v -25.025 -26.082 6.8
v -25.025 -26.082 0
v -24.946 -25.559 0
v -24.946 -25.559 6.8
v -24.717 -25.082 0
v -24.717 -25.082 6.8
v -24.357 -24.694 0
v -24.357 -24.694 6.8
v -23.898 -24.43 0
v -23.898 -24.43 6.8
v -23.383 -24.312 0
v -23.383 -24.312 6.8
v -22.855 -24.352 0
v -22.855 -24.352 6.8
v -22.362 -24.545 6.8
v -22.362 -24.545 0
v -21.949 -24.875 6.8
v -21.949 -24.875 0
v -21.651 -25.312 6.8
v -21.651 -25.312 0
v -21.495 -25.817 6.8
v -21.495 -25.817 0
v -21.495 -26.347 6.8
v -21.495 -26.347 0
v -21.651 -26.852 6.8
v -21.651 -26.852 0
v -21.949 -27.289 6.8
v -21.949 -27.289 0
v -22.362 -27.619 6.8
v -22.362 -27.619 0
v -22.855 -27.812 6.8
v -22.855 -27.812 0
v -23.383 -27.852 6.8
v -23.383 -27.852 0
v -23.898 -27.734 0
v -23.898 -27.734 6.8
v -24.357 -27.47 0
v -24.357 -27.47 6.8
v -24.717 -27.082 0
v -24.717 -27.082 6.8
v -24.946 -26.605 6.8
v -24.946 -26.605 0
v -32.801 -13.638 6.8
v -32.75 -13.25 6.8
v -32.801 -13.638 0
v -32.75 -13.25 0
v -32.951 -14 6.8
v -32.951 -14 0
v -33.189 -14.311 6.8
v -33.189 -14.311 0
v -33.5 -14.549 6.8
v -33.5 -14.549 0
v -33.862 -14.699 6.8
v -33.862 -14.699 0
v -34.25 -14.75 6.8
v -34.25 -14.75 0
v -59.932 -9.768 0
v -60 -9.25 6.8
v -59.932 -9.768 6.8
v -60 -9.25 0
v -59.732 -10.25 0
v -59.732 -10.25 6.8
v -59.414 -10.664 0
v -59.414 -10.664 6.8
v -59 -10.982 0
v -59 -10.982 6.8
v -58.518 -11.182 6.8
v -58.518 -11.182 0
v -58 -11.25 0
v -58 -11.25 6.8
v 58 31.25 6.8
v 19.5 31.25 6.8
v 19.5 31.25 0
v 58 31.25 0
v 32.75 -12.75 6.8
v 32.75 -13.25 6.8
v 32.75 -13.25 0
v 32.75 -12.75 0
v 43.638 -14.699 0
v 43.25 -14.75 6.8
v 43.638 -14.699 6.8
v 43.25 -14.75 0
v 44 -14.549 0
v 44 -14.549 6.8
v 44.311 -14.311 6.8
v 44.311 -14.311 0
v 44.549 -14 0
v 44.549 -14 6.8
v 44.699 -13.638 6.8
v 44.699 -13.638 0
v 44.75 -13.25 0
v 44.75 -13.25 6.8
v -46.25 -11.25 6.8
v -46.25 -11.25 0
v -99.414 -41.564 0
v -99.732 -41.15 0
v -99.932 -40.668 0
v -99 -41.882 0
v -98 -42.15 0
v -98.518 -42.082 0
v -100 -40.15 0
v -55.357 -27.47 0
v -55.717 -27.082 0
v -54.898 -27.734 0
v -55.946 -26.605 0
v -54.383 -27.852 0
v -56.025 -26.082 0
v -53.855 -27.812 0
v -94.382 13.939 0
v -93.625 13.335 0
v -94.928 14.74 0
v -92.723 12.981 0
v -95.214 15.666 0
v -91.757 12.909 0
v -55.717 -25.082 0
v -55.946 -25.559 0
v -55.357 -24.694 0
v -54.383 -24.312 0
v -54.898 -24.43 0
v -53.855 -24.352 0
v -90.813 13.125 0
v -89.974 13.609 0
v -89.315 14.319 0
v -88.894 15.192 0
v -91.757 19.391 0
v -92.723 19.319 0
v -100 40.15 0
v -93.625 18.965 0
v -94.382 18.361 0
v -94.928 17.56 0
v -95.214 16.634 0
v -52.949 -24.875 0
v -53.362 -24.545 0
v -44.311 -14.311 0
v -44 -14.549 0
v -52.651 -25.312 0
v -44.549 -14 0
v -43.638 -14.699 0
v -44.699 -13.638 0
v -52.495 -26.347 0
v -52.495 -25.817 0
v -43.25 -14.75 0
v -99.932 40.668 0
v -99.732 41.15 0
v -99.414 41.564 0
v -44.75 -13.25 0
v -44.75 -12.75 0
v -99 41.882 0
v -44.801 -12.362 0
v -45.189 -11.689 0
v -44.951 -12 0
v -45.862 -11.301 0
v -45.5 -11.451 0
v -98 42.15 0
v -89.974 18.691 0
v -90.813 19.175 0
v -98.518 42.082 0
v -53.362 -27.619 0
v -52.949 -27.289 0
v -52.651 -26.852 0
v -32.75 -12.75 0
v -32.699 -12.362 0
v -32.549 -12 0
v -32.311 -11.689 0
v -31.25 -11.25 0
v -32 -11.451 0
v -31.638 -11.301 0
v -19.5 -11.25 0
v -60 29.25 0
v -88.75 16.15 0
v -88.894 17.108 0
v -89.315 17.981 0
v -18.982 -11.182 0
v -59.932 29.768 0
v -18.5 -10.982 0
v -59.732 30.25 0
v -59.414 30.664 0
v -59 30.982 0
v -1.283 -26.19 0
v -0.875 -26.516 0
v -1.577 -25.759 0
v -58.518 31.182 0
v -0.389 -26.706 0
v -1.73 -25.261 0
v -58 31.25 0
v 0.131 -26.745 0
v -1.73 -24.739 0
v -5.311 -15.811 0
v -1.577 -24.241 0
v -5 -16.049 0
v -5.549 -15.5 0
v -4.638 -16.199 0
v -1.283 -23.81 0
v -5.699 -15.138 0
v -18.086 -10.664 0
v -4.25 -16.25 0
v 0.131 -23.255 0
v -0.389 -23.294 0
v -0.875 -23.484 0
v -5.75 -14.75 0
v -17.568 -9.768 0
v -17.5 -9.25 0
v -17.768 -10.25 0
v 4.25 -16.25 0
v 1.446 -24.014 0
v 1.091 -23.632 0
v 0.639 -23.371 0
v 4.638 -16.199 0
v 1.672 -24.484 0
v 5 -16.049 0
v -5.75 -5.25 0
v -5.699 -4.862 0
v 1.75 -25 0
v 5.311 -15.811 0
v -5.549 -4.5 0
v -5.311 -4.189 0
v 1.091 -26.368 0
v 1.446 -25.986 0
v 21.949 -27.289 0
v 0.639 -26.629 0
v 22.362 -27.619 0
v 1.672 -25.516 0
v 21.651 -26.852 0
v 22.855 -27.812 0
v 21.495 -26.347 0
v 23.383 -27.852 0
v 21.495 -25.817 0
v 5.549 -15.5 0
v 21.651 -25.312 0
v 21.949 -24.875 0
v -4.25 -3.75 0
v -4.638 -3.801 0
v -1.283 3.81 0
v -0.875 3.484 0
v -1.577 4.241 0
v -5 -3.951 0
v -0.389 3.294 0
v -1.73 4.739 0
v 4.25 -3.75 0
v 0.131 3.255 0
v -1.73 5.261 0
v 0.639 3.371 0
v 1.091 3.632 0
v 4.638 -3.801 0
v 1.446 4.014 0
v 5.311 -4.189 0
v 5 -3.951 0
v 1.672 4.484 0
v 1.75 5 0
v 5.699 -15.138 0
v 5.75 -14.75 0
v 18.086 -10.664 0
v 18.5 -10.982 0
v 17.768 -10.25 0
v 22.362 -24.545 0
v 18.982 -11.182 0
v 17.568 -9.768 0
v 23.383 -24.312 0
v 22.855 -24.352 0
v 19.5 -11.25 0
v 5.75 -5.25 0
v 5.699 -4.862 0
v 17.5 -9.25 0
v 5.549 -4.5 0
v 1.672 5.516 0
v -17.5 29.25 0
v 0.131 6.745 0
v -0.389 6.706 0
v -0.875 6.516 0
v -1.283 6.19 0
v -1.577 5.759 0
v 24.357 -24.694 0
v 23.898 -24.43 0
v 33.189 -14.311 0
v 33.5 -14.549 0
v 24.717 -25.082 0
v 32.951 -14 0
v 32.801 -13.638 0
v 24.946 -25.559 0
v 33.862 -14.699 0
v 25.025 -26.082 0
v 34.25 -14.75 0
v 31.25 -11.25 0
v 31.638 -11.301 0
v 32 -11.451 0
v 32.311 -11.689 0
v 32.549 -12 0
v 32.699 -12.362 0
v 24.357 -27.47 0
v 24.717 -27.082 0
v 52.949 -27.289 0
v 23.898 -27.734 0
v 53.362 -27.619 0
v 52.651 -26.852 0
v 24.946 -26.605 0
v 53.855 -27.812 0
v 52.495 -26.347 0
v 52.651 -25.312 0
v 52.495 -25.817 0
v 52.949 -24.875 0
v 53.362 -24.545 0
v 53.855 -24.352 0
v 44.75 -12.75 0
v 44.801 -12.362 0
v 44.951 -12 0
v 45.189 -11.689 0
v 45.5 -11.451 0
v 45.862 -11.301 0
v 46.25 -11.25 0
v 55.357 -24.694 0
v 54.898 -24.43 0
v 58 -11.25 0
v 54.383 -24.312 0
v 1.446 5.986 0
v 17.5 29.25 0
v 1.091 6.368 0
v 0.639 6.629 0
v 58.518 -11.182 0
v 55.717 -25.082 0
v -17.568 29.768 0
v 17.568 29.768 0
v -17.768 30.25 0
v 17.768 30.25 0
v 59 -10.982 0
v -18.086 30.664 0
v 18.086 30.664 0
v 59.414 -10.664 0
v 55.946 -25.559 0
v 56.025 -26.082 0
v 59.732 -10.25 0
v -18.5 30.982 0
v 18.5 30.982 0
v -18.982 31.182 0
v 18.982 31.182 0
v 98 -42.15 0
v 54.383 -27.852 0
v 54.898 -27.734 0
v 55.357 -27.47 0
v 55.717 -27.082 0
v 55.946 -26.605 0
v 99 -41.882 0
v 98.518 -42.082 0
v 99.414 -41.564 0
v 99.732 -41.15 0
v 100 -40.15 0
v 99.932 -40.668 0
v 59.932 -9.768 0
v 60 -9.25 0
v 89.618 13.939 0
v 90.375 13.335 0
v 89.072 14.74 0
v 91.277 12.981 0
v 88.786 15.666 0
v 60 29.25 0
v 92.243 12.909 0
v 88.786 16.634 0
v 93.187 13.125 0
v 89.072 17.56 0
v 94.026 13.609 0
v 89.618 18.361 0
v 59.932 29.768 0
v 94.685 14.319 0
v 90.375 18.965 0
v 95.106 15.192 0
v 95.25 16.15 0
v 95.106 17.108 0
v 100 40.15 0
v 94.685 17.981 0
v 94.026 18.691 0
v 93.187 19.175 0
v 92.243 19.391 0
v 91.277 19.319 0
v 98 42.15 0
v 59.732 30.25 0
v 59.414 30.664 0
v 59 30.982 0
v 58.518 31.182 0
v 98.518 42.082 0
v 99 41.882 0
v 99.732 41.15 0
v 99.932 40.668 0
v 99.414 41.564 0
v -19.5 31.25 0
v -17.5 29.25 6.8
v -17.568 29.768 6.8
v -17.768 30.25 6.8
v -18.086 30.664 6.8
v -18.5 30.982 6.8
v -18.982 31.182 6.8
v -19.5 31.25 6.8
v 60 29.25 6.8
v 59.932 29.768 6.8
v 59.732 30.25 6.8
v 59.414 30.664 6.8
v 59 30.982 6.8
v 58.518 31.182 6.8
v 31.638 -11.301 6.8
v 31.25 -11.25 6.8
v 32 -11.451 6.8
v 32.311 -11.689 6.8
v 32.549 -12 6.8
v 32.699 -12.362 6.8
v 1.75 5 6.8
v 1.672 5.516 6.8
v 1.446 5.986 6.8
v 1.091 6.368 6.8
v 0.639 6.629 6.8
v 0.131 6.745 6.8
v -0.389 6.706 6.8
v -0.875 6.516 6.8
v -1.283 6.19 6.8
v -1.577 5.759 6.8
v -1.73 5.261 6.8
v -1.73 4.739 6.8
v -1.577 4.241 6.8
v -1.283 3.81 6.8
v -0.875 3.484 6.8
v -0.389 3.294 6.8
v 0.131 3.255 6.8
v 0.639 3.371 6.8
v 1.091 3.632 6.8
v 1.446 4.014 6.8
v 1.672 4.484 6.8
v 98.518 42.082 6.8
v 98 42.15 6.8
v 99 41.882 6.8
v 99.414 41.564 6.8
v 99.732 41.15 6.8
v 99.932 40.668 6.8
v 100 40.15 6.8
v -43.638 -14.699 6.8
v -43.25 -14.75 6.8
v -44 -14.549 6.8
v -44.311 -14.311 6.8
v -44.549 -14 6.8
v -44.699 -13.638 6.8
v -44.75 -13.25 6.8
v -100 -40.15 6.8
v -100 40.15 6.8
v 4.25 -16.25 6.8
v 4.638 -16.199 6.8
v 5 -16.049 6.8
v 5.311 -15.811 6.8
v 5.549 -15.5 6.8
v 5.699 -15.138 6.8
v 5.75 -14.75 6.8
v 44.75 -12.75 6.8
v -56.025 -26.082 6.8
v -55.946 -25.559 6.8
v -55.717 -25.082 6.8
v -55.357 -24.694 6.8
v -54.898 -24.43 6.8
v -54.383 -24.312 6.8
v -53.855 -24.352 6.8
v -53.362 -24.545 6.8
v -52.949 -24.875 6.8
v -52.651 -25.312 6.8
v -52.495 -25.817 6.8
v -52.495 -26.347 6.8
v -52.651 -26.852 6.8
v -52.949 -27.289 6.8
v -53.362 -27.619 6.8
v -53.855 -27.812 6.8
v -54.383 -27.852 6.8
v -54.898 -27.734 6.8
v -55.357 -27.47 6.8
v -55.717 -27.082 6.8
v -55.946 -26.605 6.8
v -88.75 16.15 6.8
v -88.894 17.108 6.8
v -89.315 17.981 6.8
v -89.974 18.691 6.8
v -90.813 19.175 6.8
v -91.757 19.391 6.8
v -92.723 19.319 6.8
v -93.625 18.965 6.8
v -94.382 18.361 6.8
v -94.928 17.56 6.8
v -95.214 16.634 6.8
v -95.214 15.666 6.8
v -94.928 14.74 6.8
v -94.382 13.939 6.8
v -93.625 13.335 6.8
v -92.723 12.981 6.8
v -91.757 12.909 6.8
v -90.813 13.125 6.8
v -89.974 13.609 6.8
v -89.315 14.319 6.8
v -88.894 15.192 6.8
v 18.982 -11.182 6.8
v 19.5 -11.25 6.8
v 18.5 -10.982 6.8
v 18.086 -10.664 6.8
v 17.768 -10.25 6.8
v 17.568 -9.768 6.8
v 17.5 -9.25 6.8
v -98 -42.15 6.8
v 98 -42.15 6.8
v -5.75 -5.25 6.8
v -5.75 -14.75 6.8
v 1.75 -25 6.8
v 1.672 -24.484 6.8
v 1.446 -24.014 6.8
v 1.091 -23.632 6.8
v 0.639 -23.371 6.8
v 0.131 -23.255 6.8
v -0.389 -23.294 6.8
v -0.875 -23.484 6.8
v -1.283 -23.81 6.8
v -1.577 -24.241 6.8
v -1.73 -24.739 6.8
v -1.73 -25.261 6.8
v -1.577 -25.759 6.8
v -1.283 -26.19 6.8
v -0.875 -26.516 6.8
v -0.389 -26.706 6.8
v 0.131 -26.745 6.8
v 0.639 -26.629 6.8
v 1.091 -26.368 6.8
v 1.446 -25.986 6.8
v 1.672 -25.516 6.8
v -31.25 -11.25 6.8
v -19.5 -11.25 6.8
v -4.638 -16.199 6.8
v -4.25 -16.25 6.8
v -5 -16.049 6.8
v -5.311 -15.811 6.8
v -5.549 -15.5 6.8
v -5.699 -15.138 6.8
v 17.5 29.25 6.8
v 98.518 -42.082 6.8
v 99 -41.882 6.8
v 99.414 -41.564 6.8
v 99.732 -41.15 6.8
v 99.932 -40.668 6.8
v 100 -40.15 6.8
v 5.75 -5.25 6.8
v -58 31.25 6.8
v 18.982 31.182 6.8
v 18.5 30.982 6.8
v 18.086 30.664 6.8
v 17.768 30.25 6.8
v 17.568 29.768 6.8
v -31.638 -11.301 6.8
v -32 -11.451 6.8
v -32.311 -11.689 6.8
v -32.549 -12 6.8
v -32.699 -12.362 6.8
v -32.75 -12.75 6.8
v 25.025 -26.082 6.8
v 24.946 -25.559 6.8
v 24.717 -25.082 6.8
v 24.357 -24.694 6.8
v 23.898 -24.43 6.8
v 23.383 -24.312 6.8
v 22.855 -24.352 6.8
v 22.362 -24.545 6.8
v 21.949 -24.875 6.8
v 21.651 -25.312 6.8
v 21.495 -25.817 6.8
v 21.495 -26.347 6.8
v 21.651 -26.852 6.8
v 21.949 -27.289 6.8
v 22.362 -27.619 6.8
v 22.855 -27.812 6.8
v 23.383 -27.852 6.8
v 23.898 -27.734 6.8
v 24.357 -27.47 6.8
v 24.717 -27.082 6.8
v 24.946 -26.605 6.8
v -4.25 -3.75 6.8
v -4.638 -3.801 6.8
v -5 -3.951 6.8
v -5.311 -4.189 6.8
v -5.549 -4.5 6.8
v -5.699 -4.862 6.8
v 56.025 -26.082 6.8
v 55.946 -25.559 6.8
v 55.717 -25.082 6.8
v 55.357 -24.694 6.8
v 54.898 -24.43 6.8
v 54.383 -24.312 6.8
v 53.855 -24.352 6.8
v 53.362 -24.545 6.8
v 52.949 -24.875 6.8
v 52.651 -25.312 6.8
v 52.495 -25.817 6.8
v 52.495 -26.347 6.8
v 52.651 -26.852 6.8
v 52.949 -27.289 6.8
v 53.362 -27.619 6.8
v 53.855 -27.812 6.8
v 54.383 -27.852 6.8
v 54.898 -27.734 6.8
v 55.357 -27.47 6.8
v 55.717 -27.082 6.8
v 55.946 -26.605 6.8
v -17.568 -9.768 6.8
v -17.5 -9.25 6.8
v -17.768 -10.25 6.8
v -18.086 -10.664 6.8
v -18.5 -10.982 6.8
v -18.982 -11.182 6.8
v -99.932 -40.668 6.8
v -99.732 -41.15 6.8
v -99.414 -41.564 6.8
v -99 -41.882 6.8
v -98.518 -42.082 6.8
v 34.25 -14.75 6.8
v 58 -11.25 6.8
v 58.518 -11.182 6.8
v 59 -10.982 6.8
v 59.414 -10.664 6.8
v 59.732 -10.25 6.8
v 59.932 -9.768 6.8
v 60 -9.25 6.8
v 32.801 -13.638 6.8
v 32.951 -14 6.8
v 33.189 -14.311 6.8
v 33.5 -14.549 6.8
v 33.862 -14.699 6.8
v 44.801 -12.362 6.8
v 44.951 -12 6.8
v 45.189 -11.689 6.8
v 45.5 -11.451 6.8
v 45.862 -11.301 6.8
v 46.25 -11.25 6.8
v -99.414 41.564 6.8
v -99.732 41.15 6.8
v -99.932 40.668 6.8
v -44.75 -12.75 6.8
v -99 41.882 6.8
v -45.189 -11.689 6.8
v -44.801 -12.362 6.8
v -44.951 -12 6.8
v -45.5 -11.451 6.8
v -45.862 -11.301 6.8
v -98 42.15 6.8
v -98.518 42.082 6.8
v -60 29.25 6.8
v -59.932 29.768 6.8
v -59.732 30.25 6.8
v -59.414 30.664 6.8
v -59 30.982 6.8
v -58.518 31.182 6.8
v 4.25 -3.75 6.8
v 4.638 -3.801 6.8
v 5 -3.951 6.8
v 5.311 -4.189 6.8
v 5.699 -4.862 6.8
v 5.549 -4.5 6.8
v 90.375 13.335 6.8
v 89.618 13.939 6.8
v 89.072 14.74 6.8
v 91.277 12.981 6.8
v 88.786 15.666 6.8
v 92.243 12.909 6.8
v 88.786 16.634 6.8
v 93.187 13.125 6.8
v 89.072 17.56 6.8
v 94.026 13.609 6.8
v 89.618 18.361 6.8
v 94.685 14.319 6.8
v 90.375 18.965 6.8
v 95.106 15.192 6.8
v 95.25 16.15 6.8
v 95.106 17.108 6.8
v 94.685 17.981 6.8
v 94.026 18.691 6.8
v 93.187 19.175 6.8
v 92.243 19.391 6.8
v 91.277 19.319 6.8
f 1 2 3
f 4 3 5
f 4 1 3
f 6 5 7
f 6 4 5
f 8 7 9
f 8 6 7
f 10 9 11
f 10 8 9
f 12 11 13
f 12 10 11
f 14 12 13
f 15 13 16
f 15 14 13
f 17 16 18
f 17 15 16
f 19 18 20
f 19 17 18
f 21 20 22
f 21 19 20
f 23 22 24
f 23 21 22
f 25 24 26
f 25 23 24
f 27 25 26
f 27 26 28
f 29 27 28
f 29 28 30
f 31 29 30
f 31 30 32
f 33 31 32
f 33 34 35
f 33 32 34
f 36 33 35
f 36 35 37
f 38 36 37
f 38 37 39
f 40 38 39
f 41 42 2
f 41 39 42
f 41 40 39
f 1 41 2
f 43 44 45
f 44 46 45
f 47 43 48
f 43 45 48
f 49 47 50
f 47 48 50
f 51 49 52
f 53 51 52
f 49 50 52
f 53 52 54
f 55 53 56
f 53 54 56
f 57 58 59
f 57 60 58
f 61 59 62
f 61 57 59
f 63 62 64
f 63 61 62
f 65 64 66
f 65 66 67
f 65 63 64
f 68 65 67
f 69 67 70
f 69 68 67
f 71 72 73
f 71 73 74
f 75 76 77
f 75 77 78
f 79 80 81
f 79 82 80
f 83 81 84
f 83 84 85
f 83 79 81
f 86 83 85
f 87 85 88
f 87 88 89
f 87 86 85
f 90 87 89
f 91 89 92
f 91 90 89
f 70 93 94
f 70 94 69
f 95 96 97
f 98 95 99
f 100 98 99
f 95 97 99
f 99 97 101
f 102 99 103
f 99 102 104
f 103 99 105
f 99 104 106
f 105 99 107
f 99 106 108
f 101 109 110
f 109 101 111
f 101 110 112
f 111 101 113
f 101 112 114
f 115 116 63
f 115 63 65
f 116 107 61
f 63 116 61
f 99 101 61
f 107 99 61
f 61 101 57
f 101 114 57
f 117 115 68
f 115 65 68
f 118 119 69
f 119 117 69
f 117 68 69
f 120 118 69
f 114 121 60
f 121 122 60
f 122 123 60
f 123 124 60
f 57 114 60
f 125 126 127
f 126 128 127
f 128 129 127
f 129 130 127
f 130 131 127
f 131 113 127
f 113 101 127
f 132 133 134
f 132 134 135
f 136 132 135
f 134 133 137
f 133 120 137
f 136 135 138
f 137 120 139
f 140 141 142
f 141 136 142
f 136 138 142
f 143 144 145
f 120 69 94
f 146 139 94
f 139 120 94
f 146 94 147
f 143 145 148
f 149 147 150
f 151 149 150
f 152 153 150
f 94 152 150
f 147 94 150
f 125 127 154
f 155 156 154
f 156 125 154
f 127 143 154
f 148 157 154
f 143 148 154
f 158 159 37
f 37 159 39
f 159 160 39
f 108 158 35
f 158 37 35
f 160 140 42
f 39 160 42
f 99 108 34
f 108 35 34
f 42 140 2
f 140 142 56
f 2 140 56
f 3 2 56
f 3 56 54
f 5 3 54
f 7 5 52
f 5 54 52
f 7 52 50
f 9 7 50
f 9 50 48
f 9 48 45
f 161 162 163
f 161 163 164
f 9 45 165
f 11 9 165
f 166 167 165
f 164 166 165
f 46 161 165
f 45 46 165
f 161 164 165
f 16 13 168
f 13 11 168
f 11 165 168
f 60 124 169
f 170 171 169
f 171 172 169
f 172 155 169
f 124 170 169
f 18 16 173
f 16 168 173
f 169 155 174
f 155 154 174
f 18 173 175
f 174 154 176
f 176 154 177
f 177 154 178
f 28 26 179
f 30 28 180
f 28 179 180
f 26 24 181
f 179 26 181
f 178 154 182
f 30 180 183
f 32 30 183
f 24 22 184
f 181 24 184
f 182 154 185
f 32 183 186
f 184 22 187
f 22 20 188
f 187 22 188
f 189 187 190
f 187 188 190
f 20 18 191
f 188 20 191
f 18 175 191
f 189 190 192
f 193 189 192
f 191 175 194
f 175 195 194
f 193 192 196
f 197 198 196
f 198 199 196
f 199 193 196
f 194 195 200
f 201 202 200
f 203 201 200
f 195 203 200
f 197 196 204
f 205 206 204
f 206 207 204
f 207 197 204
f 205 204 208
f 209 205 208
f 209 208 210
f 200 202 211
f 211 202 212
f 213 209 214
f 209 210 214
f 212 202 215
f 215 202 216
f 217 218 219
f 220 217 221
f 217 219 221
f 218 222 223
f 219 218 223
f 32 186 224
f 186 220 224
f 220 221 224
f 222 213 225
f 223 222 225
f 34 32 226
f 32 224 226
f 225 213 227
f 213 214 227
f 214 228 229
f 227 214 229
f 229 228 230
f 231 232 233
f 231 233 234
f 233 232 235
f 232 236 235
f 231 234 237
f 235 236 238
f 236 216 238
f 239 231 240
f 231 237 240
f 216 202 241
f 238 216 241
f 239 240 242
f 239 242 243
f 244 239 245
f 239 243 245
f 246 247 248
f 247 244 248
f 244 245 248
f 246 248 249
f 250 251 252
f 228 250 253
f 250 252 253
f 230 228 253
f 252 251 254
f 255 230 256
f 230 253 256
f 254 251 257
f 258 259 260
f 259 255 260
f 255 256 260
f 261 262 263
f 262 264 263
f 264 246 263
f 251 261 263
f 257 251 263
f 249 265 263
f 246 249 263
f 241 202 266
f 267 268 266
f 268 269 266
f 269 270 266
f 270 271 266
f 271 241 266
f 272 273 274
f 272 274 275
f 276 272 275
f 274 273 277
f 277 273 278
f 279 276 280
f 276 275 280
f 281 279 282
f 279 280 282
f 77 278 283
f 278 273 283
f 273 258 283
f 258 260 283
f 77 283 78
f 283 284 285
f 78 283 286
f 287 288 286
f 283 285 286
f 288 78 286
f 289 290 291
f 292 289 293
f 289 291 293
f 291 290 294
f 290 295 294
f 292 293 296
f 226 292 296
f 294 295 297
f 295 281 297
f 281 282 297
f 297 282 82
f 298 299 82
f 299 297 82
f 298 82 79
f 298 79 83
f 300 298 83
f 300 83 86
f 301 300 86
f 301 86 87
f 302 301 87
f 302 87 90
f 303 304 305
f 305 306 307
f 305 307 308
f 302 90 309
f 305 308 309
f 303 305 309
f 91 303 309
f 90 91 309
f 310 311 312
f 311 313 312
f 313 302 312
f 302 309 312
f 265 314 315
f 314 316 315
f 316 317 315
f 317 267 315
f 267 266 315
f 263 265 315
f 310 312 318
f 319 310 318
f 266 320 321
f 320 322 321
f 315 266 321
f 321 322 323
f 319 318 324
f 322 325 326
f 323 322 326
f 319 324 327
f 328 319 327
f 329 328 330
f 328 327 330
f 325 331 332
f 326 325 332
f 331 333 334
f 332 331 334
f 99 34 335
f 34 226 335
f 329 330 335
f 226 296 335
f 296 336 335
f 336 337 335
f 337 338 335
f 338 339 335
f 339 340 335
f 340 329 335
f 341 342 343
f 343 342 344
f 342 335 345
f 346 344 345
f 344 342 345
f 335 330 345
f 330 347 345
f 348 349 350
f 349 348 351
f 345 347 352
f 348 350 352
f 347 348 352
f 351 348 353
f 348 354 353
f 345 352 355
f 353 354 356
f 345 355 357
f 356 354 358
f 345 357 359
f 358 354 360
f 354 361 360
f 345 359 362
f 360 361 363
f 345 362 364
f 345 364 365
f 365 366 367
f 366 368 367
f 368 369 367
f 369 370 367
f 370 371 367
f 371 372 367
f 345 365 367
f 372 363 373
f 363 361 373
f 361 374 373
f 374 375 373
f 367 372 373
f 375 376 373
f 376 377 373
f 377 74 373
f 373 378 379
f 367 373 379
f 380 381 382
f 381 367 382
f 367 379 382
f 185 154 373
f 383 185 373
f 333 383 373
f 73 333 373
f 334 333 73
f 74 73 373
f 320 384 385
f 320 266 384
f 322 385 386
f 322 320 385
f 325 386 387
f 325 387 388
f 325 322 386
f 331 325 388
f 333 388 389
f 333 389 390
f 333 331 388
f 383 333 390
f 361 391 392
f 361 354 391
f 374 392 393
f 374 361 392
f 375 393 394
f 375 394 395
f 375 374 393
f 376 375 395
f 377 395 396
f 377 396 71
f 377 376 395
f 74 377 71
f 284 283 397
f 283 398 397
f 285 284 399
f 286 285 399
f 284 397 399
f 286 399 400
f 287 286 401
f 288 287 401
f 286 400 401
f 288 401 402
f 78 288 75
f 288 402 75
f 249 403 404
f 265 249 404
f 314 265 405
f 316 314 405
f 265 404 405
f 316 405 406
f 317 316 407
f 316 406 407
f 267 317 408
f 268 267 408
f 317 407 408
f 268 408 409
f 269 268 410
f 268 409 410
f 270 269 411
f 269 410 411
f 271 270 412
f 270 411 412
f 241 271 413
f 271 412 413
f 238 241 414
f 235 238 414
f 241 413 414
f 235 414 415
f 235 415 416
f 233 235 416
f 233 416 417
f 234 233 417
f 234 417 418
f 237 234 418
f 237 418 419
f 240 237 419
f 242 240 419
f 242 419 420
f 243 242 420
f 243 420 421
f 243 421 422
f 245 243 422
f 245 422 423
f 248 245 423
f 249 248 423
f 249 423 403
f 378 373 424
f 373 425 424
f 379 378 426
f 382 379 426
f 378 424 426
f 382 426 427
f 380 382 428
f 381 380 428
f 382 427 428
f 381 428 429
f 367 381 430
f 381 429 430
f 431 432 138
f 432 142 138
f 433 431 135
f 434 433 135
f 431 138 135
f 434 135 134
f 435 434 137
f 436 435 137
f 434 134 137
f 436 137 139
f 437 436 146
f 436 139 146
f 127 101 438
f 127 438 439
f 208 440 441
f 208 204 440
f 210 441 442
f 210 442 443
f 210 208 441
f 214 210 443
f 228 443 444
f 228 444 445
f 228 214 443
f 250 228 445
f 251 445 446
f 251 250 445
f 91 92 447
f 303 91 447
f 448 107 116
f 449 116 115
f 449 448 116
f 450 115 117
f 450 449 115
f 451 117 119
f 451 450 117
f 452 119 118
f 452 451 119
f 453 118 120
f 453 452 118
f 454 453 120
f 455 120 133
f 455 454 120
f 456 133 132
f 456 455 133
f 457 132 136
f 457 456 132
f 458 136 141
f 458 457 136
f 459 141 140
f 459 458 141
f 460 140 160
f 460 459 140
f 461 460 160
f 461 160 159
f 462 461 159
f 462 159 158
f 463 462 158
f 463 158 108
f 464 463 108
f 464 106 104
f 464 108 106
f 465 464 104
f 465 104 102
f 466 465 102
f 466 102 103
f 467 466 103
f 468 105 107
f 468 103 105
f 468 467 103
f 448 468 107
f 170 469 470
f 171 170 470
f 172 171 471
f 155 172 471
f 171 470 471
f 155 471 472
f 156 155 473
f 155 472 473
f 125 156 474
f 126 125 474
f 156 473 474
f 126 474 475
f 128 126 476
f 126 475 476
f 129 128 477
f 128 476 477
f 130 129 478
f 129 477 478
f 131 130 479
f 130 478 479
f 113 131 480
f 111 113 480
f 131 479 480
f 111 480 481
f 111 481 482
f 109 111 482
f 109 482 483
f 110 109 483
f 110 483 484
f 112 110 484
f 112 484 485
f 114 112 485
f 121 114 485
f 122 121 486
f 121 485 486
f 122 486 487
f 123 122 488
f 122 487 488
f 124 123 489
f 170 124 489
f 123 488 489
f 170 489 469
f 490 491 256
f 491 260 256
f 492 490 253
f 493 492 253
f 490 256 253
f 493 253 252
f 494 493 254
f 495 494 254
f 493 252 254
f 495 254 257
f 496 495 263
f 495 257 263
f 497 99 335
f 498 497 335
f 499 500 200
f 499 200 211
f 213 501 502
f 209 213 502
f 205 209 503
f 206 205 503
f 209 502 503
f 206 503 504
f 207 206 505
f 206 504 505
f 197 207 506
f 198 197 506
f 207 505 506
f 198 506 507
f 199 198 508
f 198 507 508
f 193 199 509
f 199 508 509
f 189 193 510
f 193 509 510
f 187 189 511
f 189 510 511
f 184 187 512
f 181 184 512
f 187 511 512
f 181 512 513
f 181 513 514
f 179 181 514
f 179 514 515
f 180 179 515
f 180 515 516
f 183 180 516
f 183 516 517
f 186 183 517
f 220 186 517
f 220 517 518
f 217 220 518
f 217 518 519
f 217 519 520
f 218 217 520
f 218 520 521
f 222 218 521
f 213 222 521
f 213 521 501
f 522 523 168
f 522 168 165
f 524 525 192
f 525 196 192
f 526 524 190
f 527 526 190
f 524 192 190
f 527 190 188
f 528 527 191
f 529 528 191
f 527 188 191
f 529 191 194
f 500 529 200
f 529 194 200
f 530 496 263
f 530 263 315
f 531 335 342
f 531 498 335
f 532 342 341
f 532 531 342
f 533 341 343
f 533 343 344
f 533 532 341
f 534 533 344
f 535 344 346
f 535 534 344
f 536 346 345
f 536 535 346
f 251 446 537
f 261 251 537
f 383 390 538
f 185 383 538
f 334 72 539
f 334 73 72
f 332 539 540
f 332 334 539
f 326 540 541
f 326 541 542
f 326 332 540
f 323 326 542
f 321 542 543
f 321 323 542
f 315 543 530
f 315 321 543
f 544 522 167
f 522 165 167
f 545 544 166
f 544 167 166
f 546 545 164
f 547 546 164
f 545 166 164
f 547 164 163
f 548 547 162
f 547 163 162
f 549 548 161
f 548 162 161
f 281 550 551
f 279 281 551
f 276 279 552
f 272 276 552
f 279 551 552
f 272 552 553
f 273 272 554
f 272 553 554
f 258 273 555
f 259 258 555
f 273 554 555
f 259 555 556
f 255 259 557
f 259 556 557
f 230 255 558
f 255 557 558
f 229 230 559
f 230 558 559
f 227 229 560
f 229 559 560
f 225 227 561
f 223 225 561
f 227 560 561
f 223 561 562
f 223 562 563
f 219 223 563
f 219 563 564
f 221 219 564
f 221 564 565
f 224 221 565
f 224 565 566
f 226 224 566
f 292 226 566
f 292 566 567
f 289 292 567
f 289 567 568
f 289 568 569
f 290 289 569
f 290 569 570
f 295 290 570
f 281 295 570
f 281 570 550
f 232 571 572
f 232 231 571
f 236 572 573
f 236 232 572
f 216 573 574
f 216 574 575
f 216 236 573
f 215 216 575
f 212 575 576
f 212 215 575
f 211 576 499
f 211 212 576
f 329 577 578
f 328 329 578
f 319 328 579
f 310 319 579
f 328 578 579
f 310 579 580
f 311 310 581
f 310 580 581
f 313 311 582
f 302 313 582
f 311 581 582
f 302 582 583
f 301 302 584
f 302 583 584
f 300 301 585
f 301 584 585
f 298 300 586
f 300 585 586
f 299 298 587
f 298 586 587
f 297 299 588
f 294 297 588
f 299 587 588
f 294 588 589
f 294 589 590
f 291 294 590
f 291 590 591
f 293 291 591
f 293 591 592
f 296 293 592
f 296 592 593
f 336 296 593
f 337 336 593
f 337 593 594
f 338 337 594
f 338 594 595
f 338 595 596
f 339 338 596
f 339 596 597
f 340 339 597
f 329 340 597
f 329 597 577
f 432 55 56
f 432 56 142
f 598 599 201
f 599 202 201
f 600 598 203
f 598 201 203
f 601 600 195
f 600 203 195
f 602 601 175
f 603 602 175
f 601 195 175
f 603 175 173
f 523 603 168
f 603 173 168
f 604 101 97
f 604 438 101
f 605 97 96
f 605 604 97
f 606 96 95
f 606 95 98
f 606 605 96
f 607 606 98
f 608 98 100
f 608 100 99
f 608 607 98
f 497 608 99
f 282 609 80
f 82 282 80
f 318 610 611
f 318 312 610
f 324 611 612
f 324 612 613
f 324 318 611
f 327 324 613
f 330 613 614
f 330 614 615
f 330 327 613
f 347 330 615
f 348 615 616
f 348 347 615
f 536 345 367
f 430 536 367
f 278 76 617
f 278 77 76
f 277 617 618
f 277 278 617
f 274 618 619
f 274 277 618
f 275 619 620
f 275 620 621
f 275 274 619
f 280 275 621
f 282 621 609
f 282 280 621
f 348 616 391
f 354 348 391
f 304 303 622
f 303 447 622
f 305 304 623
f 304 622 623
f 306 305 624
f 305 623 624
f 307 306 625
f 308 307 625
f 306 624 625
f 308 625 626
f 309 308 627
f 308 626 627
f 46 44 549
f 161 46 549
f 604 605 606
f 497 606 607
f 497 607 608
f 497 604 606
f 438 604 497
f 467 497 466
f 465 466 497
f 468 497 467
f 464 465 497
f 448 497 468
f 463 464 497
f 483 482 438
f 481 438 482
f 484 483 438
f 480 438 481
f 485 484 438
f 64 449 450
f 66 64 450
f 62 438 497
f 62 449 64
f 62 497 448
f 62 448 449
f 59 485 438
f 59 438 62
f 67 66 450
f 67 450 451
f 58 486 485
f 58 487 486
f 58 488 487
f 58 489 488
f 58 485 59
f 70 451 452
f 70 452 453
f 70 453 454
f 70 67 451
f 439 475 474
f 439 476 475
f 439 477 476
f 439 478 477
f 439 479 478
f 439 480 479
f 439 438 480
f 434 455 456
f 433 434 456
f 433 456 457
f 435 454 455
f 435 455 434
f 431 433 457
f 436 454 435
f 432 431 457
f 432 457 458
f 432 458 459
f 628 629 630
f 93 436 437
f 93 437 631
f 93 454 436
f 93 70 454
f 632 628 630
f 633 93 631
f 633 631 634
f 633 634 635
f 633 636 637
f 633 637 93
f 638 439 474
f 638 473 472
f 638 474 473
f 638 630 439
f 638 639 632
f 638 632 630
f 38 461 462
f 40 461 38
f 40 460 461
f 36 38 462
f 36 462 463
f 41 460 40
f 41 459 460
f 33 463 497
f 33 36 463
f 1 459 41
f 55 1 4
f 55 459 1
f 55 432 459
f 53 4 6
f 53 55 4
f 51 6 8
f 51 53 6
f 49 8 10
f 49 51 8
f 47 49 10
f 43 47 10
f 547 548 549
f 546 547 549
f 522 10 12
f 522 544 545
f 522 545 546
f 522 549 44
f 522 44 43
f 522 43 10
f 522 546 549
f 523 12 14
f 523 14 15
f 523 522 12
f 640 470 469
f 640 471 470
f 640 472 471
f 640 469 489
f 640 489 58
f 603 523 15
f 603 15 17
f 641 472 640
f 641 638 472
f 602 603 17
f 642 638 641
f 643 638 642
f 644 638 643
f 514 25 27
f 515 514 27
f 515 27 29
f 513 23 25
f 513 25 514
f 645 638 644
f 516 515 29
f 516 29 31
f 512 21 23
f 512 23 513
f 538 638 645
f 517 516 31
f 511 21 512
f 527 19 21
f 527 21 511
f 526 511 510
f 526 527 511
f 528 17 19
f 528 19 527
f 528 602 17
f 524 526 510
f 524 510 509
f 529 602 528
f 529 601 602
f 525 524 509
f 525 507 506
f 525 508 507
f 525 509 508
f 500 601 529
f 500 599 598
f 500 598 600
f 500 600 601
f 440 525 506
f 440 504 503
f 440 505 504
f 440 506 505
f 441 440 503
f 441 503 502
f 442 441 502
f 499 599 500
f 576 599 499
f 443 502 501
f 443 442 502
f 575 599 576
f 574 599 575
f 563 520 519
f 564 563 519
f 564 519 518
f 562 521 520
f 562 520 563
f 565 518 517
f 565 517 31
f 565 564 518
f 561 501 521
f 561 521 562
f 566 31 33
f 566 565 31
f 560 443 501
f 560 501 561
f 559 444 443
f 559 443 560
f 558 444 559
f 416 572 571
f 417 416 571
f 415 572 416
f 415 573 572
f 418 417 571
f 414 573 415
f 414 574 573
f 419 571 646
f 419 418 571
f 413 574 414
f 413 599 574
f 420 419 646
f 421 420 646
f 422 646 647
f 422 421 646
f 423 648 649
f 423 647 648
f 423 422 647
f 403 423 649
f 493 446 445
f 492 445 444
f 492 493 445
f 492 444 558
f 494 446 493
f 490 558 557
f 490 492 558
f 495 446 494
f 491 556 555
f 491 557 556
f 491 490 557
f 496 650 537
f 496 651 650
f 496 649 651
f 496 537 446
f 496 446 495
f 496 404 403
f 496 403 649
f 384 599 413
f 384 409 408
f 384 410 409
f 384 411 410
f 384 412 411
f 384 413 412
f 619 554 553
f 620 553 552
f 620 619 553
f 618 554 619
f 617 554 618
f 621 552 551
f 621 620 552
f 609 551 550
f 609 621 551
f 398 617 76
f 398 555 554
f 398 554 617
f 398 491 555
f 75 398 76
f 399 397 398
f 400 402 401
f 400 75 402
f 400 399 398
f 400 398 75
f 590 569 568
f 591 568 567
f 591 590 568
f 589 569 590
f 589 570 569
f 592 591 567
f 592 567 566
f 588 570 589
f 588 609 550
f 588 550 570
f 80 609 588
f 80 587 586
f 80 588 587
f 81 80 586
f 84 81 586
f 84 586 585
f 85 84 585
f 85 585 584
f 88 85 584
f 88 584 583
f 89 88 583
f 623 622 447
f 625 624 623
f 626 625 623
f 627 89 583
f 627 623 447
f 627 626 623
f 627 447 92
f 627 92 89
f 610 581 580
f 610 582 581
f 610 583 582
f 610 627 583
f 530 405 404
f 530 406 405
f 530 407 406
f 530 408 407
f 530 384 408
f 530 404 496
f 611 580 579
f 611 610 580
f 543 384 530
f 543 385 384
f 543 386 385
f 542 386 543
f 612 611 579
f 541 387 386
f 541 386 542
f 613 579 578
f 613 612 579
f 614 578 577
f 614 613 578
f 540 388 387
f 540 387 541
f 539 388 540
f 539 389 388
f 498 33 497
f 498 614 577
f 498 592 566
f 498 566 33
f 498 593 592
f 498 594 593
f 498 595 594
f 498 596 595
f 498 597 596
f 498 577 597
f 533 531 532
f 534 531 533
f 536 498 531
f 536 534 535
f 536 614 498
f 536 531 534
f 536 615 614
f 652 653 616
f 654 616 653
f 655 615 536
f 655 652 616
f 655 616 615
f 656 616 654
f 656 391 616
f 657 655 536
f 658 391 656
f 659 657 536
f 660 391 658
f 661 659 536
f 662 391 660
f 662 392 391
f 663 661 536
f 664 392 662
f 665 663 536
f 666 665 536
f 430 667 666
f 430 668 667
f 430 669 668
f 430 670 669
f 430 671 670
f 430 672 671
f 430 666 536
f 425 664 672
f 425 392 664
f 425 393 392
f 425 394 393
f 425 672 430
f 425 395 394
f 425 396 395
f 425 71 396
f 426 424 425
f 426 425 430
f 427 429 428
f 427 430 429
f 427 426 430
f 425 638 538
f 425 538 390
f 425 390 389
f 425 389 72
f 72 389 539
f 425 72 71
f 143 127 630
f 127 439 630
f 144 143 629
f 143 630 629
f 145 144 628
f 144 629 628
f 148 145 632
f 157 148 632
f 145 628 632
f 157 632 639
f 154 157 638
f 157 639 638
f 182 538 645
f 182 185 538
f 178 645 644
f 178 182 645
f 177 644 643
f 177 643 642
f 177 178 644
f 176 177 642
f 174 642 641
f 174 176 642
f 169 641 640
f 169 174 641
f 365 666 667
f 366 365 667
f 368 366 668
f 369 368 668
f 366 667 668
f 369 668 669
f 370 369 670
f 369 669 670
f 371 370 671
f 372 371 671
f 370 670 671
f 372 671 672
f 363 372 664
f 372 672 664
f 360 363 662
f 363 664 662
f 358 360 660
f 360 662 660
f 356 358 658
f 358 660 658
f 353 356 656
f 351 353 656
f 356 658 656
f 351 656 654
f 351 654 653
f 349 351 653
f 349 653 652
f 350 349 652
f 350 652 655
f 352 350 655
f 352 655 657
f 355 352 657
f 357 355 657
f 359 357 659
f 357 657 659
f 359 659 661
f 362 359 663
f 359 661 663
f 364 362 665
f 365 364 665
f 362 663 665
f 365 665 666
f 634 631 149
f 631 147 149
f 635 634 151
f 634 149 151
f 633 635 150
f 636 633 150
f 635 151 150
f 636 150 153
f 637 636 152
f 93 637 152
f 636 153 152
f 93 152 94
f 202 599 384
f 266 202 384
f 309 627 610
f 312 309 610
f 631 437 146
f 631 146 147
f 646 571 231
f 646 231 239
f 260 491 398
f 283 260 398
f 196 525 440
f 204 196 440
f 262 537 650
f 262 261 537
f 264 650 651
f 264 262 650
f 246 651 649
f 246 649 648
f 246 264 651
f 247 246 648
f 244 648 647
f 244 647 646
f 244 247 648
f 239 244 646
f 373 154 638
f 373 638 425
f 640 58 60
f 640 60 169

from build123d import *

# Parameters (mm, degrees)
SKETCH1_W            = 200
SKETCH1_H            = 84.3
BOSS_EXTRUDE1_DEPTH  = 6.8
SKETCH2_R            = 3.25
CUT_EXTRUDE1_DEPTH   = 6.8
FILLET1_R            = 2
SKETCH3_R            = 1.775
SKETCH3_W            = 42.5
SKETCH3_H            = 42.5
CUT_EXTRUDE2_DEPTH   = 7.8
FILLET2_R            = 2
SKETCH4_W            = 12
SKETCH4_H            = 7
CUT_EXTRUDE3_DEPTH   = 7.8
FILLET3_R            = 1.5
SKETCH5_R            = 1.75
SKETCH5_W            = 11.5
SKETCH5_H            = 12.5
CUT_EXTRUDE4_DEPTH   = 7.8
FILLET4_R            = 1.5
FILLET2_OF_MIRROR2_R = 2
FILLET3_OF_MIRROR2_R = 1.5


with BuildPart() as part:
    # Sketch1 → Boss-Extrude1 (new body)
    with BuildSketch(Plane.XY):
        Rectangle(SKETCH1_W, SKETCH1_H)
    extrude(amount=BOSS_EXTRUDE1_DEPTH)

    # Sketch2 → Cut-Extrude1 (cut)
    with BuildSketch(Plane.XY.offset(6.8)):
        with Locations((-92, 16.15)):
            Circle(SKETCH2_R)
        with Locations((92, 16.15)):
            Circle(SKETCH2_R)
    extrude(amount=-CUT_EXTRUDE1_DEPTH, mode=Mode.SUBTRACT)

    # Fillet1
    fillet1_edges = [part.edges().sort_by_distance(p)[0] for p in [
        (-100, 42.15, 3.4),
        (100, 42.15, 3.4),
        (100, -42.15, 3.4),
        (-100, -42.15, 3.4),
    ]]
    fillet(fillet1_edges, radius=FILLET1_R)

    # Sketch3 → Cut-Extrude2 (cut, through all)
    with BuildSketch(Plane.XY.offset(6.8)):
        with Locations((23.25, -26.082)):
            Circle(SKETCH3_R)
        with Locations((54.25, -26.082)):
            Circle(SKETCH3_R)
        with Locations((38.75, 10)):
            Rectangle(SKETCH3_W, SKETCH3_H)
    cut_extrude2 = extrude(amount=-CUT_EXTRUDE2_DEPTH, mode=Mode.SUBTRACT)

    # Fillet2
    fillet2_edges = [part.edges().sort_by_distance(p)[0] for p in [
        (17.5, -11.25, 3.4),
        (17.5, 31.25, 3.4),
        (60, 31.25, 3.4),
        (60, -11.25, 3.4),
    ]]
    fillet(fillet2_edges, radius=FILLET2_R)

    # Sketch4 → Cut-Extrude3 (cut, through all)
    with BuildSketch(Plane.XY.offset(6.8)):
        with Locations((38.75, -11.25)):
            Rectangle(SKETCH4_W, SKETCH4_H)
    cut_extrude3 = extrude(amount=-CUT_EXTRUDE3_DEPTH, mode=Mode.SUBTRACT)

    # Fillet3
    fillet3_edges = [part.edges().sort_by_distance(p)[0] for p in [
        (44.75, -11.25, 3.4),
        (32.75, -11.25, 3.4),
        (32.75, -14.75, 3.4),
        (44.75, -14.75, 3.4),
    ]]
    fillet(fillet3_edges, radius=FILLET3_R)

    # Sketch5 → Cut-Extrude4 (cut, through all)
    with BuildSketch(Plane.XY.offset(6.8)):
        with Locations((0, -25)):
            Circle(SKETCH5_R)
        with Locations((0, 5)):
            Circle(SKETCH5_R)
        with Locations((0, -10)):
            Rectangle(SKETCH5_W, SKETCH5_H)
    extrude(amount=-CUT_EXTRUDE4_DEPTH, mode=Mode.SUBTRACT)

    # Fillet4
    fillet4_edges = [part.edges().sort_by_distance(p)[0] for p in [
        (-5.75, -16.25, 3.4),
        (-5.75, -3.75, 3.4),
        (5.75, -3.75, 3.4),
        (5.75, -16.25, 3.4),
    ]]
    fillet(fillet4_edges, radius=FILLET4_R)

    # Mirror2: Cut-Extrude2, Cut-Extrude3 across plane
    add(cut_extrude2.mirror(Plane(origin=(0, 0, 0), x_dir=(0, 0, 1), z_dir=(1, 0, 0))), mode=Mode.SUBTRACT)
    add(cut_extrude3.mirror(Plane(origin=(0, 0, 0), x_dir=(0, 0, 1), z_dir=(1, 0, 0))), mode=Mode.SUBTRACT)

    # Fillet2 of Mirror2
    fillet2_of_mirror2_edges = [part.edges().sort_by_distance(p)[0] for p in [
        (-17.5, -11.25, 3.4),
        (-17.5, 31.25, 3.4),
        (-60, 31.25, 3.4),
        (-60, -11.25, 3.4),
    ]]
    fillet(fillet2_of_mirror2_edges, radius=FILLET2_OF_MIRROR2_R)

    # Fillet3 of Mirror2
    fillet3_of_mirror2_edges = [part.edges().sort_by_distance(p)[0] for p in [
        (-44.75, -11.25, 3.4),
        (-32.75, -11.25, 3.4),
        (-32.75, -14.75, 3.4),
        (-44.75, -14.75, 3.4),
    ]]
    fillet(fillet3_of_mirror2_edges, radius=FILLET3_OF_MIRROR2_R)


solid = part.part
